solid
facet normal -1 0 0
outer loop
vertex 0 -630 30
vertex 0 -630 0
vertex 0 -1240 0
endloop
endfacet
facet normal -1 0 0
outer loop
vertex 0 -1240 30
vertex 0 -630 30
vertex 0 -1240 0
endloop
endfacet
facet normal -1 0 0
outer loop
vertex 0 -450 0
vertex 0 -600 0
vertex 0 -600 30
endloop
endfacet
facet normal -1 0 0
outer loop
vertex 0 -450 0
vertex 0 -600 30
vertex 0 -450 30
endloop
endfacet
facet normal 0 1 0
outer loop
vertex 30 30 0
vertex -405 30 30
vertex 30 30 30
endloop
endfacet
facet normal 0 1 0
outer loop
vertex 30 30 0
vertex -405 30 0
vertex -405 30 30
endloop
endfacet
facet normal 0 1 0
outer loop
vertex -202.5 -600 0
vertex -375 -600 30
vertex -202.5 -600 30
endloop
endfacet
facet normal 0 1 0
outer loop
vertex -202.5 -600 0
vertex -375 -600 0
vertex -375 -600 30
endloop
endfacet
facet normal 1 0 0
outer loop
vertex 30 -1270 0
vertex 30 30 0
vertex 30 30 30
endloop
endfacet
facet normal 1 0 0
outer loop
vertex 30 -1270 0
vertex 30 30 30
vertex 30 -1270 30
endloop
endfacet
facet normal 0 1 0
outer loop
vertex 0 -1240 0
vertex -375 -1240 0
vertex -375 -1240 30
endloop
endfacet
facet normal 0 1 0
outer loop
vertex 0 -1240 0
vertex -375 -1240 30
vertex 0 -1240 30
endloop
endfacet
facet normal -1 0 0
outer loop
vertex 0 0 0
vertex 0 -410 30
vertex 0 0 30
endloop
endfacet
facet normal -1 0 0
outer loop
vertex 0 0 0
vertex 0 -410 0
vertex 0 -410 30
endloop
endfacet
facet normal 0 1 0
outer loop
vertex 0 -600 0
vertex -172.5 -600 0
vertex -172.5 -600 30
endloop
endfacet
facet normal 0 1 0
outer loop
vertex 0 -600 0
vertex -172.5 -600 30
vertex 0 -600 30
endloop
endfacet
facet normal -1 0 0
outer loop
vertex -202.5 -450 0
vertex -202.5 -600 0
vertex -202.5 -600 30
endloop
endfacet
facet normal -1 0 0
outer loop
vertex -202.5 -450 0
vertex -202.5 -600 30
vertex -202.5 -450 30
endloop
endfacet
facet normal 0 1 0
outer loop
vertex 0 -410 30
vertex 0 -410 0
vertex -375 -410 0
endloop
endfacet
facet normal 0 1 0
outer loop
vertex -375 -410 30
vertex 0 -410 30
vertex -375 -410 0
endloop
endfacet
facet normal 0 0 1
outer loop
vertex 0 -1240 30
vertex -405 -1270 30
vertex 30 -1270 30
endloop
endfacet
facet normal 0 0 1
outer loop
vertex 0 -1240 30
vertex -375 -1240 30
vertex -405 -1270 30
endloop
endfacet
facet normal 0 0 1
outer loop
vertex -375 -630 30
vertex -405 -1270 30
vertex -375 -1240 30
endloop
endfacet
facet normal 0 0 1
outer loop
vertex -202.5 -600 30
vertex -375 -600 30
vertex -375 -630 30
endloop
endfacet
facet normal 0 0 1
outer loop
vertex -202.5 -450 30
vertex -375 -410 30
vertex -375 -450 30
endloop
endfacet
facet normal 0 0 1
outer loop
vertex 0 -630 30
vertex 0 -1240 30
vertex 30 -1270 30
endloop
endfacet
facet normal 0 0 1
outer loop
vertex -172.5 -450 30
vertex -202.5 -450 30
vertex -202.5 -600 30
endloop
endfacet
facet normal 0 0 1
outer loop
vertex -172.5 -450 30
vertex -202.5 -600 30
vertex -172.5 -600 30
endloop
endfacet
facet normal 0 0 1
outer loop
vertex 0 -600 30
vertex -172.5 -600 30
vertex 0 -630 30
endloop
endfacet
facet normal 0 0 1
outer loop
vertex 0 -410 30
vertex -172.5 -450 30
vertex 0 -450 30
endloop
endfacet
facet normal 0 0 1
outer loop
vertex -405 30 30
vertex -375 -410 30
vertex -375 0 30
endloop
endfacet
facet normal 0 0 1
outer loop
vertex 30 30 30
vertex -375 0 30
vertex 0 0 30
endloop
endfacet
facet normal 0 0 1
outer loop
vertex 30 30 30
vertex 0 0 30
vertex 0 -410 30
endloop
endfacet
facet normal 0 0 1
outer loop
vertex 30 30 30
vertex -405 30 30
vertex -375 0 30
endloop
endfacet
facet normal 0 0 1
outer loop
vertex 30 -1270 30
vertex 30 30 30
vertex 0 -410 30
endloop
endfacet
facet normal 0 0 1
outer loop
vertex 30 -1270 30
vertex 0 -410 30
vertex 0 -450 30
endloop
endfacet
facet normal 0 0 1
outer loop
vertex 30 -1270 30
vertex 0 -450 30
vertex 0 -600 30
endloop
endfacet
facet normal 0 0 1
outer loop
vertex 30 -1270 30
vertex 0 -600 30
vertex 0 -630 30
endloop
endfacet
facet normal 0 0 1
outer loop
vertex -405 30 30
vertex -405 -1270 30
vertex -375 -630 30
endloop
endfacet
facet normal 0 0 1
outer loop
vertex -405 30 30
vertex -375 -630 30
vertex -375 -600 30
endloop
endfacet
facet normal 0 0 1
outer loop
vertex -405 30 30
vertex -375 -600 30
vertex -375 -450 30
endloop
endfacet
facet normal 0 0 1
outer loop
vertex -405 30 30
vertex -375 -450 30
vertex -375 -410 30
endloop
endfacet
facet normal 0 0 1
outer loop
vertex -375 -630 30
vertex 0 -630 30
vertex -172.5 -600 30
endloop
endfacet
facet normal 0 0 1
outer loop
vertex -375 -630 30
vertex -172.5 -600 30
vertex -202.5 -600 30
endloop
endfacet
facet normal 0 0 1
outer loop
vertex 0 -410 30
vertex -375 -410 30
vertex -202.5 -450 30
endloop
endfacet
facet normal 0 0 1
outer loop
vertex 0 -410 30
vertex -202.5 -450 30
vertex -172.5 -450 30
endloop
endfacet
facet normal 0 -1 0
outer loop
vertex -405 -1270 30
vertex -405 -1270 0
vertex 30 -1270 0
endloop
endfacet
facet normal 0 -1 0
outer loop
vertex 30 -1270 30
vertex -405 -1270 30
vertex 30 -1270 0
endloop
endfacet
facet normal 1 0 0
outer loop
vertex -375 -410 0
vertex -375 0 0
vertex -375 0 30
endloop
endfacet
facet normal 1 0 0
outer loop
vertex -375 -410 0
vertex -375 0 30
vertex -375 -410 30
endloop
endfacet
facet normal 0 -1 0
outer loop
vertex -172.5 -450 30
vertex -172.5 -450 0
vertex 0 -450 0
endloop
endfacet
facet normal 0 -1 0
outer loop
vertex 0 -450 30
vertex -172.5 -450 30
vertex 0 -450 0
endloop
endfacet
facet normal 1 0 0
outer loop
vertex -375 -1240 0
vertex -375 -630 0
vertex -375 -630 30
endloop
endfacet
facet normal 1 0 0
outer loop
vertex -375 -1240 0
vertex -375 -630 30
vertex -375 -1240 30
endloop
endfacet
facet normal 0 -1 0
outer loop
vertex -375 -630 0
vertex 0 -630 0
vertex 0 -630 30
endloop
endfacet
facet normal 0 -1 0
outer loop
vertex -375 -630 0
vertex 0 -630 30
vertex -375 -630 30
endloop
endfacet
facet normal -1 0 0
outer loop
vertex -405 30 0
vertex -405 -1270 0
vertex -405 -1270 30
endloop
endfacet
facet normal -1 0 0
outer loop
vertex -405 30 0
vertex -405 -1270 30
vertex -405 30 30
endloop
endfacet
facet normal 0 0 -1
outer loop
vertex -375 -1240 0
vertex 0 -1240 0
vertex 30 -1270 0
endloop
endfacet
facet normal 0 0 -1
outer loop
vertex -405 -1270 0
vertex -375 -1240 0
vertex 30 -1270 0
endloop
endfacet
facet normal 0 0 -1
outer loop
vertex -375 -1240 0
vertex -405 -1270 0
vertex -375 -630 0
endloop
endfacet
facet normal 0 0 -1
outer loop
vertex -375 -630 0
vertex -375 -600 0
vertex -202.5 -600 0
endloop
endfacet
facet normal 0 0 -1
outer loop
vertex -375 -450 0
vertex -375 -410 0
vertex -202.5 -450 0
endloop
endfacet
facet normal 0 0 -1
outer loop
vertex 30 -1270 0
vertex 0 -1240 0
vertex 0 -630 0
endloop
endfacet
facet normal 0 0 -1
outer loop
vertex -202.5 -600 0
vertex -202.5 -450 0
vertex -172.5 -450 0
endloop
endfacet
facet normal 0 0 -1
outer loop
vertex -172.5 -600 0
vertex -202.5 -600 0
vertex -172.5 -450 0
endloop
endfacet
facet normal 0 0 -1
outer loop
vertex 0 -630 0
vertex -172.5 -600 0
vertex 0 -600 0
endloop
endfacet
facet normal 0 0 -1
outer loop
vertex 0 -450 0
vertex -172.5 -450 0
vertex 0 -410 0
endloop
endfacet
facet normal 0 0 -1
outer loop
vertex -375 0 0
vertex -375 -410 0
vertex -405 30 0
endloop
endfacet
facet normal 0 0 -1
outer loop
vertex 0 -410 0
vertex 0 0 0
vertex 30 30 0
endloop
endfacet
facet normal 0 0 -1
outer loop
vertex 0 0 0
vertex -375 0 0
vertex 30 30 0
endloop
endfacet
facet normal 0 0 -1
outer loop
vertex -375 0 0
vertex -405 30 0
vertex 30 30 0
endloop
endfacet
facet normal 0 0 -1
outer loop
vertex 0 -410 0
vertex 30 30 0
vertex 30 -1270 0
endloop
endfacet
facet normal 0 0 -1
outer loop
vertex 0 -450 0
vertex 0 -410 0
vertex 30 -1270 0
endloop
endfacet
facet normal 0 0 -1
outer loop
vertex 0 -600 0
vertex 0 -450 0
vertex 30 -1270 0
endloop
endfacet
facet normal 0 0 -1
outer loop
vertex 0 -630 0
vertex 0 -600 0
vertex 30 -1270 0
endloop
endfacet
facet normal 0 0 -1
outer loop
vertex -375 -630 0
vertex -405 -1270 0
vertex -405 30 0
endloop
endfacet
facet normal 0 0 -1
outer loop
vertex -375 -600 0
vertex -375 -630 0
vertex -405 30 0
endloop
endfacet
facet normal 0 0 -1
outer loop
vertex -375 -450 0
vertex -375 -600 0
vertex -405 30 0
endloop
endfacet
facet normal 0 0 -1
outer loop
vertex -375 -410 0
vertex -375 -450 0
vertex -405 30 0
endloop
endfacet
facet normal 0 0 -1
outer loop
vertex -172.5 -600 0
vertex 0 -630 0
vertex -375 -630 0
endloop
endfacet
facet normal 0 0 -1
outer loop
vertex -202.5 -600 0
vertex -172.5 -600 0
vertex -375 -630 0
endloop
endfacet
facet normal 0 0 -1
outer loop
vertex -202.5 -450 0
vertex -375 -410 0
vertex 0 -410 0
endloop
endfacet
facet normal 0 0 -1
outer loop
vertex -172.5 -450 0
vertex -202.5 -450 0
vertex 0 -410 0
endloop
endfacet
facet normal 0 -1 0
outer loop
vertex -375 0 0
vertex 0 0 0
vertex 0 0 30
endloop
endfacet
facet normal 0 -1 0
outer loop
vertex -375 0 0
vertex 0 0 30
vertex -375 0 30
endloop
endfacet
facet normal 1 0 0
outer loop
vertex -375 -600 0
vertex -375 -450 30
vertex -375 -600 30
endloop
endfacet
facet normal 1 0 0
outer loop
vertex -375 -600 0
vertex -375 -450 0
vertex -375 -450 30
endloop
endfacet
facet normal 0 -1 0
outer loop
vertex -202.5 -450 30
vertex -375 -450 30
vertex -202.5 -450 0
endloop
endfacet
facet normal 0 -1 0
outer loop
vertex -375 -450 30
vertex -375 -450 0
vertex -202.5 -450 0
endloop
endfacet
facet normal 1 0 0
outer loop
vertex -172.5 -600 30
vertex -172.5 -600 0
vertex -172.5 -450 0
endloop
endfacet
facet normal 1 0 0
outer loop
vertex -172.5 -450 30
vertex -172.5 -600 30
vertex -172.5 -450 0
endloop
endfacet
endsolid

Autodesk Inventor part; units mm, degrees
ref_plane "YZ Plane" through (0, 0, 0) normal (1, 0, 0) x (0, 1, 0)
ref_plane "XZ Plane" through (0, 0, 0) normal (0, 1, 0) x (-1, 0, 0)
ref_plane "XY Plane" through (0, 0, 0) normal (0, 0, 1) x (1, 0, 0)
sketch "Sketch1" plane through (0, 0, 0) normal (0, 0, 1) x (1, 0, 0)
  line L0 (0, 0) -> (-375, 0)
  line L1 (-375, 0) -> (-375, -600)
  line L2 (-375, -600) -> (0, -600)
  line L3 (0, -600) -> (0, 0)
  line L4 (-405, 30) -> (30, 30)
  line L5 (30, 30) -> (30, -630)
  line L6 (30, -630) -> (-405, -630)
  line L7 (-405, -630) -> (-405, 30)
  line L8 (-405, -630) -> (-375, -630)
  line L9 (-375, -630) -> (-375, -1270)
  line L10 (-375, -1270) -> (-405, -1270)
  line L11 (-405, -1270) -> (-405, -630)
  line L12 (30, -630) -> (0, -630)
  line L13 (0, -630) -> (0, -1270)
  line L14 (0, -1270) -> (30, -1270)
  line L15 (30, -1270) -> (30, -630)
  line L16 (-375, -1270) -> (0, -1270)
  line L17 (0, -1270) -> (0, -1240)
  line L18 (0, -1240) -> (-375, -1240)
  line L19 (-375, -1240) -> (-375, -1270)
  dimension "d0" = 375
  dimension "d1" = 600
  dimension "d2" = 30
  dimension "d3" = 30
  dimension "d4" = 30
  dimension "d5" = 30
  dimension "d38" = 30
  dimension "d39" = 640
  dimension "d40" = 30
  dimension "d41" = 640
  dimension "d42" = 30
extrude "Extrusion1" add sketch "Sketch1" along normal blind 30 contours L4 L5 L6 L7
sketch "Sketch2" plane through (0, 0, 0) normal (0, 0, -1) x (-1, 0, 0)
  line L0 (375, -600) -> (375, 0) projected
  line L1 (375, -450) -> (0, -450)
  line L2 (0, -450) -> (0, -410)
  line L3 (0, -410) -> (375, -410)
  line L4 (375, -410) -> (375, -450)
  line L5 (0, -600) -> (375, -600) projected
  line L6 (202.5, -600) -> (202.5, -450)
  line L7 (172.5, -600) -> (172.5, -450)
  point P0 (0, 0)
  dimension "d8" = 375
  dimension "d9" = 40
  dimension "d10" = 150
extrude "Extrusion2" add sketch "Sketch2" against normal blind 30 contours L1 L2 L3 L0 | L5 L7 L1 L6
sketch "Sketch3" plane through (0, 0, 30) normal (0, 0, 1) x (1, 0, 0)
  line L0 (12.5, -490) -> (17.5, -490)
  line L1 (17.5, -490) -> (17.5, -200)
  line L2 (17.5, -200) -> (12.5, -200)
  line L3 (12.5, -200) -> (12.5, -490)
  line L4 (0, -410) -> (-375, -410) projected
  line L5 (-392.5, -490) -> (-387.5, -490)
  line L6 (-387.5, -490) -> (-387.5, -200)
  line L7 (-387.5, -200) -> (-392.5, -200)
  line L8 (-392.5, -200) -> (-392.5, -490)
  line L9 (0, -600) -> (-172.5, -600) projected
  point P0 (0, 0)
  dimension "d13" = 5
  dimension "d14" = 290
  dimension "d18" = 405
  dimension "d37" = 110
extrude "Extrusion3" [suppressed]
sketch "Sketch4" plane through (30, -630, 0) normal (1, 0, 0) x (0, 0, -1)
  line L0 (-30, 0) -> (-30, 660) projected
  line L1 (-30, 660) -> (-657.8518, 828.2324)
  line L2 (-30, 660) -> (620, 660) construction
  line L3 (-657.8518, 828.2324) -> (-665.6164, 799.2546)
  line L4 (-665.6164, 799.2546) -> (-30, 628.9417)
  point P0 (0, 630)
  dimension "d25" = 650
  dimension "d26" = 165
  dimension "d27" = 30
  dimension "d28" = 270
extrude "Extrusion4" [suppressed]
pattern_linear "Rectangular Pattern1" [suppressed]
sketch "Sketch5" plane through (-375, 0, 30) normal (1, 0, 0) x (0, 0, -1)
  line L0 (-635.6164, 169.2546) -> (-627.8518, 198.2324) projected
  line L1 (0, -1.0583) -> (-635.6164, 169.2546) projected
  line L2 (-627.8518, 198.2324) -> (-635.6164, 169.2546)
  line L3 (-635.6164, 169.2546) -> (-606.6386, 161.49)
  line L4 (-606.6386, 161.49) -> (-598.874, 190.4678)
  line L5 (-627.8518, 198.2324) -> (0, 30) projected
  line L6 (-627.8518, 198.2324) -> (-598.874, 190.4678)
  point P0 (30, 0)
  dimension "d34" = 30
extrude "Extrusion5" [suppressed]
sketch "Sketch6" plane through (0, 0, 0) normal (0, 0, -1) x (-1, 0, 0)
  line L0 (0, -630) -> (0, -1270)
  line L1 (0, -1270) -> (-30, -1270)
  line L2 (-30, -1270) -> (-30, -630)
  line L3 (375, -630) -> (375, -1270)
  line L4 (375, -1270) -> (405, -1270)
  line L5 (405, -1270) -> (405, -630)
  line L6 (0, -1270) -> (375, -1270)
  line L7 (375, -1270) -> (375, -1240)
  line L8 (375, -1240) -> (0, -1240)
  line L9 (0, -1240) -> (0, -1270)
  line L10 (405, 30) -> (405, -630) projected
  line L11 (-30, -630) -> (-30, 30) projected
  line L12 (405, -630) -> (375, -630)
  line L13 (405, -630) -> (-30, -630) projected
  line L14 (0, -630) -> (-30, -630)
  point P0 (0, 0)
  point P1 (405, -1.0583)
  point P2 (-30, -1.0583)
  dimension "d43" = 30
  dimension "d44" = 640
  dimension "d45" = 30
  dimension "d46" = 640
  dimension "d47" = 30
  dimension "d48" = 0
  dimension "d49" = 0
extrude "Extrusion6" add sketch "Sketch6" against normal blind 30 contours L0 L1 L2 L13 | L8 L3 L6 L0 | L12 L5 L4 L3
sketch "Sketch7" plane through (0, 0, 0) normal (0, 0, -1) x (-1, 0, 0)
  circle A0 centre (187.5, -430) radius 40
  point P0 (0, 0)
  dimension "d52" = 80
sketch "Sketch8" plane through (30, -1270, 0) normal (1, 0, 0) x (0, 0, -1)
  line L0 (0, 0) -> (-30, 0) projected
  line L1 (-30, 0) -> (-311.9078, 102.606)
  line L2 (-30, 0) -> (270, 0) construction
  line L3 (-311.9078, 102.606) -> (-301.6472, 130.7968)
  line L4 (-301.6472, 130.7968) -> (-30, 31.9253)
  line L5 (-30, 640) -> (-30, 30) projected
  line L6 (-30, 31.9253) -> (-30, 0)
  point P0 (0, 1270)
  dimension "d55" = 300
  dimension "d56" = 160
  dimension "d57" = 30
  dimension "d58" = 90
sketch "Sketch9" plane through (0, -1240, 0) normal (-1, 0, 0) x (0, 0, 1)
  line L0 (311.9078, 72.606) -> (301.6472, 100.7968) projected
  line L1 (311.9078, 72.606) -> (301.6472, 100.7968)
  line L2 (301.6472, 100.7968) -> (273.4564, 90.5362)
  line L3 (30, 1.9253) -> (301.6472, 100.7968) projected
  line L4 (273.4564, 90.5362) -> (283.717, 62.3454)
  line L5 (30, -30) -> (311.9078, 72.606) projected
  line L6 (283.717, 62.3454) -> (311.9078, 72.606)
  point P0 (0, 1240)
  dimension "d64" = 30
sketch "Sketch10" plane through (0, 0, 30) normal (0, 0, 1) x (1, 0, 0)
  line L0 (-405, -1238.0747) -> (-375, -1238.0747) projected
  line L1 (-405, -1238.0747) -> (30, -1238.0747)
  line L2 (30, -1238.0747) -> (30, -598.0747)
  line L3 (30, -598.0747) -> (-405, -598.0747)
  line L4 (-405, -598.0747) -> (-405, -1238.0747)
  point P0 (0, 0)
  dimension "d67" = 435
  dimension "d68" = 640
sketch "Sketch11" plane through (0, 0, 32) normal (0, 0, 1) x (1, 0, 0)
  line L0 (30, -648.0747) -> (0, -648.0747)
  line L1 (0, -648.0747) -> (0, -678.0747)
  line L2 (0, -678.0747) -> (30, -678.0747)
  line L3 (30, -678.0747) -> (30, -648.0747)
  line L4 (30, -598.0747) -> (-405, -598.0747) projected
  point P0 (0, 0)
  dimension "d71" = 30
  dimension "d72" = 30
  dimension "d73" = 50
sketch "Sketch12" plane through (0, 0, 382) normal (0, 0, 1) x (1, 0, 0)
  line L0 (-405, -868.0747) -> (-405, -898.0747) projected
  line L1 (-405, -898.0747) -> (-375, -898.0747) projected
  line L2 (-375, -898.0747) -> (-375, -868.0747) projected
  line L3 (-375, -868.0747) -> (-405, -868.0747) projected
  line L4 (-405, -648.0747) -> (-405, -678.0747) projected
  line L5 (-405, -678.0747) -> (-375, -678.0747) projected
  line L6 (-375, -678.0747) -> (-375, -648.0747) projected
  line L7 (-375, -648.0747) -> (-405, -648.0747) projected
  line L8 (0, -648.0747) -> (0, -678.0747) projected
  line L9 (0, -678.0747) -> (30, -678.0747) projected
  line L10 (30, -678.0747) -> (30, -648.0747) projected
  line L11 (30, -648.0747) -> (0, -648.0747) projected
  line L12 (0, -868.0747) -> (0, -898.0747) projected
  line L13 (0, -898.0747) -> (30, -898.0747) projected
  line L14 (30, -898.0747) -> (30, -868.0747) projected
  line L15 (30, -868.0747) -> (0, -868.0747) projected
  line L16 (-405, -898.0747) -> (-375, -898.0747) projected
  line L17 (-405, -898.0747) -> (30, -898.0747)
  line L18 (30, -898.0747) -> (30, -648.0747)
  line L19 (30, -648.0747) -> (-405, -648.0747)
  line L20 (-405, -648.0747) -> (-405, -898.0747)
  point P0 (0, 0)
  point P1 (0, -898.0747)
  point P2 (30, -868.0747)
  point P3 (30, -678.0747)
  point P4 (0, -648.0747)
sketch "Sketch13" plane through (-405, -1270, 0) normal (-1, 0, 0) x (0, 0, 1)
  line L0 (232, 591.9253) -> (202, 591.9253)
  line L1 (202, 591.9253) -> (202, 741.9253)
  line L2 (202, 741.9253) -> (232, 741.9253)
  line L3 (232, 741.9253) -> (232, 591.9253)
  line L4 (32, 591.9253) -> (379, 591.9253) projected
  line L5 (382, 621.9253) -> (382, 371.9253) projected
  point P0 (0, 1270)
  dimension "d84" = 30
  dimension "d85" = 150
  dimension "d86" = 0
  dimension "d87" = 150
sketch "Sketch14" plane through (-435, -1270, 0) normal (-1, 0, 0) x (0, 0, 1)
  line L0 (232, 741.9253) -> (202, 741.9253) projected
  line L1 (232, 741.9253) -> (202, 741.9253)
  line L2 (202, 741.9253) -> (202, 711.9253)
  line L3 (202, 711.9253) -> (232, 711.9253)
  line L4 (232, 711.9253) -> (232, 741.9253)
  point P0 (0, 1270)
  point P1 (202, 741.9253)
  dimension "d90" = 30
  dimension "d91" = 30
sketch "Sketch15" plane through (30, -1270, 0) normal (1, 0, 0) x (0, 0, -1)
  line L0 (-657.8518, 1468.2324) -> (-665.6164, 1439.2546) construction
  circle A0 centre (-661.7341, 1453.7435) radius 7.5 construction
  circle A1 centre (-654.5905, 1451.4588) radius 4
  point P0 (0, 1270)
  dimension "d96" = 15
  dimension "d97" = 8
properties part number "rama pod fotel v2 bez mocowań kierownicy"
